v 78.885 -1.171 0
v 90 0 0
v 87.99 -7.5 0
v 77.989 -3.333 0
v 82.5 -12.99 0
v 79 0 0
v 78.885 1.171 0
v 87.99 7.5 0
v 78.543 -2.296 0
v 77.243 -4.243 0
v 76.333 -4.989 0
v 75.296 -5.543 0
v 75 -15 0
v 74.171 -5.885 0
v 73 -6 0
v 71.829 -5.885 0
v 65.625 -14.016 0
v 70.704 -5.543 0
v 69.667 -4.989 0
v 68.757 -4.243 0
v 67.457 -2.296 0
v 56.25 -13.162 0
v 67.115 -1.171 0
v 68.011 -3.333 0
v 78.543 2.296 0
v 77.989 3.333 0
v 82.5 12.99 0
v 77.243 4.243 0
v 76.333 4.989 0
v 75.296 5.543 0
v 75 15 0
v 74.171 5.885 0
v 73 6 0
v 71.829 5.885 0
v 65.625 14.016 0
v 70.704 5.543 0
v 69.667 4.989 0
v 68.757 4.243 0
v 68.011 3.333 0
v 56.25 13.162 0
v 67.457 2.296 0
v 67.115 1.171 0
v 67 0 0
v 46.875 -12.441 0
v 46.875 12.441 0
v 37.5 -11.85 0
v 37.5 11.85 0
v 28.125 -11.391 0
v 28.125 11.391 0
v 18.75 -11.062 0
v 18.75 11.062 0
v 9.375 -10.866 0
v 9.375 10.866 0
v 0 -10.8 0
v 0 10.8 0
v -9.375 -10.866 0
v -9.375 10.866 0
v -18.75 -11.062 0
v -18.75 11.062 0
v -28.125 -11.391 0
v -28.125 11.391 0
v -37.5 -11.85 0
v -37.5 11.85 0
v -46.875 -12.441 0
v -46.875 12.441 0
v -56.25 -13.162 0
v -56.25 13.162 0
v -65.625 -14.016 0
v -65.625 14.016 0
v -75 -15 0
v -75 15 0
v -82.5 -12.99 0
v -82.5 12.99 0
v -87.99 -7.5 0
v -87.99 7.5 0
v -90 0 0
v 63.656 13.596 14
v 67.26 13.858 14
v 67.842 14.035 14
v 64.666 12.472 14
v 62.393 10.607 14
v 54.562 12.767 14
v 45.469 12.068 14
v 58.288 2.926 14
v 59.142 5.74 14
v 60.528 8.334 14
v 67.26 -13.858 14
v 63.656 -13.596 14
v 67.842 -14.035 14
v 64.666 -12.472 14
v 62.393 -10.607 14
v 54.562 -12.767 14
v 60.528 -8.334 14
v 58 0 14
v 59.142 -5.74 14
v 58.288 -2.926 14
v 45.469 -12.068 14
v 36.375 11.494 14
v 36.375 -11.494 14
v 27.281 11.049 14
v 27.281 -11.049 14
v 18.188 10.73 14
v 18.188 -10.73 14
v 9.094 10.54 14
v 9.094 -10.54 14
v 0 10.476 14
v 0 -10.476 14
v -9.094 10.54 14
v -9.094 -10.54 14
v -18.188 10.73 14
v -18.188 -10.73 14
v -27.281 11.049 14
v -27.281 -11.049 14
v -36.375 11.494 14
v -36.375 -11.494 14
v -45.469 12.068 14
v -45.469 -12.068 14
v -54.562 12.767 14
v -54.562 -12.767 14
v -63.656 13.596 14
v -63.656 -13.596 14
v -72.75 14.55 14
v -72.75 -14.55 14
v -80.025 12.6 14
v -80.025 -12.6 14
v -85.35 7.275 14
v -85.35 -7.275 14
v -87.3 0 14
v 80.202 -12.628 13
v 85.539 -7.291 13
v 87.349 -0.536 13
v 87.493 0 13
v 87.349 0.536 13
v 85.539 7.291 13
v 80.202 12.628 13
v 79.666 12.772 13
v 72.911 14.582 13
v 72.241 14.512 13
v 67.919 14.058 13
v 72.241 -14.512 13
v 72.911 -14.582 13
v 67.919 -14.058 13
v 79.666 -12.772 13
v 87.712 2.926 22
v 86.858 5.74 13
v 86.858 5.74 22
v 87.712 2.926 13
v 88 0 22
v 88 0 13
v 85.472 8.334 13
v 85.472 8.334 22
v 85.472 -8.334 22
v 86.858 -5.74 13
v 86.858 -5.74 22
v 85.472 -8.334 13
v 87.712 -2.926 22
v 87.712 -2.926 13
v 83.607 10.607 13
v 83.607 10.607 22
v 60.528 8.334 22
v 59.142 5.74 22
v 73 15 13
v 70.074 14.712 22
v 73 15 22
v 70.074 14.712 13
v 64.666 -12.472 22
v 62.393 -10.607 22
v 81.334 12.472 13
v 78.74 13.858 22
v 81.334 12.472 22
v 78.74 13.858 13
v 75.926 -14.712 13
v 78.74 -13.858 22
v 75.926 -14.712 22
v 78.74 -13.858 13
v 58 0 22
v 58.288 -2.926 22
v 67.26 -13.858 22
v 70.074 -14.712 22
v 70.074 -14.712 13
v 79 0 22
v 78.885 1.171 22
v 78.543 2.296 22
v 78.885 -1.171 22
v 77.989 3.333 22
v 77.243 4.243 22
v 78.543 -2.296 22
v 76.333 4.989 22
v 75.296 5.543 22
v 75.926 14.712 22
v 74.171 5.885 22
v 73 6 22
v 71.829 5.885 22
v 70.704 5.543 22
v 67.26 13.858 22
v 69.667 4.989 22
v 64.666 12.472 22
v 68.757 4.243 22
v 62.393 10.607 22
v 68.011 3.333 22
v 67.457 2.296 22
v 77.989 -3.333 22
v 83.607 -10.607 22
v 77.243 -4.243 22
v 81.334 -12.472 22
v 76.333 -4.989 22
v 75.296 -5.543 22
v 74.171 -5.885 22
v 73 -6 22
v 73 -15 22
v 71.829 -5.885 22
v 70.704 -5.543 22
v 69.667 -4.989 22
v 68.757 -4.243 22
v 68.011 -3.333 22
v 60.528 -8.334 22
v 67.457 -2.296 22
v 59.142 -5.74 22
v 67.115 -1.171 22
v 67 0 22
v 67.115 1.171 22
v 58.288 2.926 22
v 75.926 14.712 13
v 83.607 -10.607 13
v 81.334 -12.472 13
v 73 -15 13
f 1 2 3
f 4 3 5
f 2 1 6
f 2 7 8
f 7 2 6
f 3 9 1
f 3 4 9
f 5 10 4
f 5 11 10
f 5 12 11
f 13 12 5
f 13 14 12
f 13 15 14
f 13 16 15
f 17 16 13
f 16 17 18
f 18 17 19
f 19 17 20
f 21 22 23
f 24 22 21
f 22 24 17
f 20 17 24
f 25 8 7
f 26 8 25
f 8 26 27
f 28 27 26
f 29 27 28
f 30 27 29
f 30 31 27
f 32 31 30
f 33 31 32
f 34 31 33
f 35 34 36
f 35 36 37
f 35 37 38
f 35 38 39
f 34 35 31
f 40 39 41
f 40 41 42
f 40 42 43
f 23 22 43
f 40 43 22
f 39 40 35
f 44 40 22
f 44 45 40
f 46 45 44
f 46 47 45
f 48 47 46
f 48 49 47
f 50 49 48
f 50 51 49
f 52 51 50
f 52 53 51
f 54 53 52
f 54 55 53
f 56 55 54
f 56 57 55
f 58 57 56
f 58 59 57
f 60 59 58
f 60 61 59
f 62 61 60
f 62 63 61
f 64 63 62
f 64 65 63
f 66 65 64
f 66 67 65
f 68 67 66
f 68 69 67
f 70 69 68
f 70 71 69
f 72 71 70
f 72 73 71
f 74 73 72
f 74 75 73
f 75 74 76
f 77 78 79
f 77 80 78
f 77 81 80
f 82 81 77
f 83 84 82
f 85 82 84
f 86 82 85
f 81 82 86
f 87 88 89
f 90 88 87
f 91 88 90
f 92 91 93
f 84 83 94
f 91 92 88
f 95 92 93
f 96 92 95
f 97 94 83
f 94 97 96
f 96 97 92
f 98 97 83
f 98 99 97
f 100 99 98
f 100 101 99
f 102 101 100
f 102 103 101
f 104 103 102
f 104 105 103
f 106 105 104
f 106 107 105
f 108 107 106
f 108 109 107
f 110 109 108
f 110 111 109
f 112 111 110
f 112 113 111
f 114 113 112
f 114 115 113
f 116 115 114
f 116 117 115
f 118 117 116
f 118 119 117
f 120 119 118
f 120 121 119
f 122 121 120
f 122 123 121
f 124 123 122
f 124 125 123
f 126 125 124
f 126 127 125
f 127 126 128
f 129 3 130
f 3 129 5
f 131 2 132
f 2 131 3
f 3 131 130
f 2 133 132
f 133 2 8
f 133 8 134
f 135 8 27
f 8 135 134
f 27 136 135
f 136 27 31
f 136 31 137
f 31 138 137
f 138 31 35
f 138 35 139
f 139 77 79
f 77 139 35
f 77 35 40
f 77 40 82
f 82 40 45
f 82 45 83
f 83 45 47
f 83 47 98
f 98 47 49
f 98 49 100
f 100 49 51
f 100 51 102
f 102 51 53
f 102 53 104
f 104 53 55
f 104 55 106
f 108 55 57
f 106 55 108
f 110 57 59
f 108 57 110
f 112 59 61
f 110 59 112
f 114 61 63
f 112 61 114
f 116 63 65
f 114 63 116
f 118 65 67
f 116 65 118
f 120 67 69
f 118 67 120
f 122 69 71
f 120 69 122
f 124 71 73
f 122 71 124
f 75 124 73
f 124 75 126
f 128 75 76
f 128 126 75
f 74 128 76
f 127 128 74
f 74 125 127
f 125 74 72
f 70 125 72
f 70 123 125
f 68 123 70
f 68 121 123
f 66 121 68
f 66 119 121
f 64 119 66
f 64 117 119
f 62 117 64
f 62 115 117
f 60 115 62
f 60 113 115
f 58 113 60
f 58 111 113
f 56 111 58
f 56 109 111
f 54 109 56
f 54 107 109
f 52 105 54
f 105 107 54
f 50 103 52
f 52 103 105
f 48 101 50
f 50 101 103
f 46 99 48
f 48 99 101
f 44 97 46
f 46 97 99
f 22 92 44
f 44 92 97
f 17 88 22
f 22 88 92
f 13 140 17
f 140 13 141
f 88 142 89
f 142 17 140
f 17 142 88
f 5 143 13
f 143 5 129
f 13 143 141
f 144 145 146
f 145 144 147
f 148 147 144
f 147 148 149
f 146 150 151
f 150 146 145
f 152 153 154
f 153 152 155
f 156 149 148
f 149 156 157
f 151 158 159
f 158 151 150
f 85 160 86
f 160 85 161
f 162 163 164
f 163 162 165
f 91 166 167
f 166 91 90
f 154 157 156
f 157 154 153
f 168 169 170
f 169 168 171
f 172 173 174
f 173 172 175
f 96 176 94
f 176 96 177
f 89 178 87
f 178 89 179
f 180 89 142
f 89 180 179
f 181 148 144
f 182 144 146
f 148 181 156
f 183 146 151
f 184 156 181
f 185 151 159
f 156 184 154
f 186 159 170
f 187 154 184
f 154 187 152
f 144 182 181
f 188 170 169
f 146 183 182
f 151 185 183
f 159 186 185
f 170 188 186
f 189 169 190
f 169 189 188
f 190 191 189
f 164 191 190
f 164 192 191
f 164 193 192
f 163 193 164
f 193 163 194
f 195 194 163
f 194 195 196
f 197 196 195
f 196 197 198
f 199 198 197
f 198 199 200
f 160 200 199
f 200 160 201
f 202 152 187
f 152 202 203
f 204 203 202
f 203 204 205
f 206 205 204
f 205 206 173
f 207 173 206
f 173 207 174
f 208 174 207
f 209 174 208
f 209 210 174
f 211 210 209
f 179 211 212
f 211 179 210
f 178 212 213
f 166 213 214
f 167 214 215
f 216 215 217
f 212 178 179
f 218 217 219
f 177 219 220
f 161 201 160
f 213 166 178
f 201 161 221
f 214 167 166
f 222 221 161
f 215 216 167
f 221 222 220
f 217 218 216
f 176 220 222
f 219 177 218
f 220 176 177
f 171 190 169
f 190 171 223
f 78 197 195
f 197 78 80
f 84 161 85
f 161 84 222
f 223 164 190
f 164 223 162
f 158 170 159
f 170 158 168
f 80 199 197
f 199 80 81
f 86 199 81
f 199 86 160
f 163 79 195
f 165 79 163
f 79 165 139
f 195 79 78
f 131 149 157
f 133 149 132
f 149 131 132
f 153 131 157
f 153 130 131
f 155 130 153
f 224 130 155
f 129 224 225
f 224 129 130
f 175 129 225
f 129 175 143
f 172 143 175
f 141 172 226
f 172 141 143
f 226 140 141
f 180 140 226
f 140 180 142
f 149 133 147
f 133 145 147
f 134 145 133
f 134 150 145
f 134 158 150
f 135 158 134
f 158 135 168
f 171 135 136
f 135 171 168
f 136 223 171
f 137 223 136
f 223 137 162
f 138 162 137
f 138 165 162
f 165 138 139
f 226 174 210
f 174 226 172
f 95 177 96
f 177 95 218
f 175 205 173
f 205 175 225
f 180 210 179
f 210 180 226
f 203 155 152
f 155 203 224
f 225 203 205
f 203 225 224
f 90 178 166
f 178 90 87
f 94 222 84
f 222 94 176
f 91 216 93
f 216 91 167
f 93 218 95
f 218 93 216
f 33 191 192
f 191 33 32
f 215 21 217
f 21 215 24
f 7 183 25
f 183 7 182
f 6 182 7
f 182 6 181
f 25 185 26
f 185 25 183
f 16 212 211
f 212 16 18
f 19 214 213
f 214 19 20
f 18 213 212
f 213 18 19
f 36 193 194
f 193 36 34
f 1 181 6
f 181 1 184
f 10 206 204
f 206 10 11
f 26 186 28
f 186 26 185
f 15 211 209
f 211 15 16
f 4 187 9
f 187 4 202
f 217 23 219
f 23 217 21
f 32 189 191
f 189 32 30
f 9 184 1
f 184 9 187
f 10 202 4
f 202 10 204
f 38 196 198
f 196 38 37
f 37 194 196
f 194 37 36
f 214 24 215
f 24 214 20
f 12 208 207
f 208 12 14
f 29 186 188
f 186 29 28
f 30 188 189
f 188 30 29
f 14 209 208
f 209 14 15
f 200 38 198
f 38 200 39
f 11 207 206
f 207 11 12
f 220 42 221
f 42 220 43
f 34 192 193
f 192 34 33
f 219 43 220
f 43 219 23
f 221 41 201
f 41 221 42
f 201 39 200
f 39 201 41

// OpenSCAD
$fn = 32;

// ----------------------------------------------------------------------
// Handle: 180 x 30 mm grip, 14 mm thick
// ----------------------------------------------------------------------

// --- parameters (mm) ---
length = 180;             // grip length
width = 30;               // grip width
thickness = 14;           // grip thickness
waist = 0.72;             // width factor at the middle
draft = 0.97;             // top face scale of the extrusion
boss_d = 30;              // mounting boss diameter
boss_h = 8;               // mounting boss height
boss_hole_d = 12;         // screw clearance through the boss
boss_r = 73;              // boss centre from the grip centre

/* ergonomic grip outline, closed spline-like polygon in the XY plane */
grip = [[-75, 15], [-65.625, 14.016], [-56.25, 13.162], [-46.875, 12.441], [-37.5, 11.85], [-28.125, 11.391], [-18.75, 11.062], [-9.375, 10.866], [0, 10.8], [9.375, 10.866], [18.75, 11.062], [28.125, 11.391], [37.5, 11.85], [46.875, 12.441], [56.25, 13.162], [65.625, 14.016], [75, 15], [82.5, 12.99], [87.99, 7.5], [90, 0], [87.99, -7.5], [82.5, -12.99], [75, -15], [75, -15], [65.625, -14.016], [56.25, -13.162], [46.875, -12.441], [37.5, -11.85], [28.125, -11.391], [18.75, -11.062], [9.375, -10.866], [0, -10.8], [-9.375, -10.866], [-18.75, -11.062], [-28.125, -11.391], [-37.5, -11.85], [-46.875, -12.441], [-56.25, -13.162], [-65.625, -14.016], [-75, -15], [-82.5, -12.99], [-87.99, -7.5], [-90, 0], [-87.99, 7.5], [-82.5, 12.99], [-75, 15]];

module grip_body() {
  linear_extrude(height = thickness, scale = draft) polygon(grip);
}

module boss_body() {
  /* sunk 1 mm into the grip so the joint overlaps */
  translate([boss_r, 0, thickness - 1]) cylinder(h = boss_h + 1, d = boss_d);
}

difference() {
  union() {
    grip_body();
    boss_body();
  }
  translate([boss_r, 0, -1]) cylinder(h = thickness + boss_h + 2, d = boss_hole_d);
}
